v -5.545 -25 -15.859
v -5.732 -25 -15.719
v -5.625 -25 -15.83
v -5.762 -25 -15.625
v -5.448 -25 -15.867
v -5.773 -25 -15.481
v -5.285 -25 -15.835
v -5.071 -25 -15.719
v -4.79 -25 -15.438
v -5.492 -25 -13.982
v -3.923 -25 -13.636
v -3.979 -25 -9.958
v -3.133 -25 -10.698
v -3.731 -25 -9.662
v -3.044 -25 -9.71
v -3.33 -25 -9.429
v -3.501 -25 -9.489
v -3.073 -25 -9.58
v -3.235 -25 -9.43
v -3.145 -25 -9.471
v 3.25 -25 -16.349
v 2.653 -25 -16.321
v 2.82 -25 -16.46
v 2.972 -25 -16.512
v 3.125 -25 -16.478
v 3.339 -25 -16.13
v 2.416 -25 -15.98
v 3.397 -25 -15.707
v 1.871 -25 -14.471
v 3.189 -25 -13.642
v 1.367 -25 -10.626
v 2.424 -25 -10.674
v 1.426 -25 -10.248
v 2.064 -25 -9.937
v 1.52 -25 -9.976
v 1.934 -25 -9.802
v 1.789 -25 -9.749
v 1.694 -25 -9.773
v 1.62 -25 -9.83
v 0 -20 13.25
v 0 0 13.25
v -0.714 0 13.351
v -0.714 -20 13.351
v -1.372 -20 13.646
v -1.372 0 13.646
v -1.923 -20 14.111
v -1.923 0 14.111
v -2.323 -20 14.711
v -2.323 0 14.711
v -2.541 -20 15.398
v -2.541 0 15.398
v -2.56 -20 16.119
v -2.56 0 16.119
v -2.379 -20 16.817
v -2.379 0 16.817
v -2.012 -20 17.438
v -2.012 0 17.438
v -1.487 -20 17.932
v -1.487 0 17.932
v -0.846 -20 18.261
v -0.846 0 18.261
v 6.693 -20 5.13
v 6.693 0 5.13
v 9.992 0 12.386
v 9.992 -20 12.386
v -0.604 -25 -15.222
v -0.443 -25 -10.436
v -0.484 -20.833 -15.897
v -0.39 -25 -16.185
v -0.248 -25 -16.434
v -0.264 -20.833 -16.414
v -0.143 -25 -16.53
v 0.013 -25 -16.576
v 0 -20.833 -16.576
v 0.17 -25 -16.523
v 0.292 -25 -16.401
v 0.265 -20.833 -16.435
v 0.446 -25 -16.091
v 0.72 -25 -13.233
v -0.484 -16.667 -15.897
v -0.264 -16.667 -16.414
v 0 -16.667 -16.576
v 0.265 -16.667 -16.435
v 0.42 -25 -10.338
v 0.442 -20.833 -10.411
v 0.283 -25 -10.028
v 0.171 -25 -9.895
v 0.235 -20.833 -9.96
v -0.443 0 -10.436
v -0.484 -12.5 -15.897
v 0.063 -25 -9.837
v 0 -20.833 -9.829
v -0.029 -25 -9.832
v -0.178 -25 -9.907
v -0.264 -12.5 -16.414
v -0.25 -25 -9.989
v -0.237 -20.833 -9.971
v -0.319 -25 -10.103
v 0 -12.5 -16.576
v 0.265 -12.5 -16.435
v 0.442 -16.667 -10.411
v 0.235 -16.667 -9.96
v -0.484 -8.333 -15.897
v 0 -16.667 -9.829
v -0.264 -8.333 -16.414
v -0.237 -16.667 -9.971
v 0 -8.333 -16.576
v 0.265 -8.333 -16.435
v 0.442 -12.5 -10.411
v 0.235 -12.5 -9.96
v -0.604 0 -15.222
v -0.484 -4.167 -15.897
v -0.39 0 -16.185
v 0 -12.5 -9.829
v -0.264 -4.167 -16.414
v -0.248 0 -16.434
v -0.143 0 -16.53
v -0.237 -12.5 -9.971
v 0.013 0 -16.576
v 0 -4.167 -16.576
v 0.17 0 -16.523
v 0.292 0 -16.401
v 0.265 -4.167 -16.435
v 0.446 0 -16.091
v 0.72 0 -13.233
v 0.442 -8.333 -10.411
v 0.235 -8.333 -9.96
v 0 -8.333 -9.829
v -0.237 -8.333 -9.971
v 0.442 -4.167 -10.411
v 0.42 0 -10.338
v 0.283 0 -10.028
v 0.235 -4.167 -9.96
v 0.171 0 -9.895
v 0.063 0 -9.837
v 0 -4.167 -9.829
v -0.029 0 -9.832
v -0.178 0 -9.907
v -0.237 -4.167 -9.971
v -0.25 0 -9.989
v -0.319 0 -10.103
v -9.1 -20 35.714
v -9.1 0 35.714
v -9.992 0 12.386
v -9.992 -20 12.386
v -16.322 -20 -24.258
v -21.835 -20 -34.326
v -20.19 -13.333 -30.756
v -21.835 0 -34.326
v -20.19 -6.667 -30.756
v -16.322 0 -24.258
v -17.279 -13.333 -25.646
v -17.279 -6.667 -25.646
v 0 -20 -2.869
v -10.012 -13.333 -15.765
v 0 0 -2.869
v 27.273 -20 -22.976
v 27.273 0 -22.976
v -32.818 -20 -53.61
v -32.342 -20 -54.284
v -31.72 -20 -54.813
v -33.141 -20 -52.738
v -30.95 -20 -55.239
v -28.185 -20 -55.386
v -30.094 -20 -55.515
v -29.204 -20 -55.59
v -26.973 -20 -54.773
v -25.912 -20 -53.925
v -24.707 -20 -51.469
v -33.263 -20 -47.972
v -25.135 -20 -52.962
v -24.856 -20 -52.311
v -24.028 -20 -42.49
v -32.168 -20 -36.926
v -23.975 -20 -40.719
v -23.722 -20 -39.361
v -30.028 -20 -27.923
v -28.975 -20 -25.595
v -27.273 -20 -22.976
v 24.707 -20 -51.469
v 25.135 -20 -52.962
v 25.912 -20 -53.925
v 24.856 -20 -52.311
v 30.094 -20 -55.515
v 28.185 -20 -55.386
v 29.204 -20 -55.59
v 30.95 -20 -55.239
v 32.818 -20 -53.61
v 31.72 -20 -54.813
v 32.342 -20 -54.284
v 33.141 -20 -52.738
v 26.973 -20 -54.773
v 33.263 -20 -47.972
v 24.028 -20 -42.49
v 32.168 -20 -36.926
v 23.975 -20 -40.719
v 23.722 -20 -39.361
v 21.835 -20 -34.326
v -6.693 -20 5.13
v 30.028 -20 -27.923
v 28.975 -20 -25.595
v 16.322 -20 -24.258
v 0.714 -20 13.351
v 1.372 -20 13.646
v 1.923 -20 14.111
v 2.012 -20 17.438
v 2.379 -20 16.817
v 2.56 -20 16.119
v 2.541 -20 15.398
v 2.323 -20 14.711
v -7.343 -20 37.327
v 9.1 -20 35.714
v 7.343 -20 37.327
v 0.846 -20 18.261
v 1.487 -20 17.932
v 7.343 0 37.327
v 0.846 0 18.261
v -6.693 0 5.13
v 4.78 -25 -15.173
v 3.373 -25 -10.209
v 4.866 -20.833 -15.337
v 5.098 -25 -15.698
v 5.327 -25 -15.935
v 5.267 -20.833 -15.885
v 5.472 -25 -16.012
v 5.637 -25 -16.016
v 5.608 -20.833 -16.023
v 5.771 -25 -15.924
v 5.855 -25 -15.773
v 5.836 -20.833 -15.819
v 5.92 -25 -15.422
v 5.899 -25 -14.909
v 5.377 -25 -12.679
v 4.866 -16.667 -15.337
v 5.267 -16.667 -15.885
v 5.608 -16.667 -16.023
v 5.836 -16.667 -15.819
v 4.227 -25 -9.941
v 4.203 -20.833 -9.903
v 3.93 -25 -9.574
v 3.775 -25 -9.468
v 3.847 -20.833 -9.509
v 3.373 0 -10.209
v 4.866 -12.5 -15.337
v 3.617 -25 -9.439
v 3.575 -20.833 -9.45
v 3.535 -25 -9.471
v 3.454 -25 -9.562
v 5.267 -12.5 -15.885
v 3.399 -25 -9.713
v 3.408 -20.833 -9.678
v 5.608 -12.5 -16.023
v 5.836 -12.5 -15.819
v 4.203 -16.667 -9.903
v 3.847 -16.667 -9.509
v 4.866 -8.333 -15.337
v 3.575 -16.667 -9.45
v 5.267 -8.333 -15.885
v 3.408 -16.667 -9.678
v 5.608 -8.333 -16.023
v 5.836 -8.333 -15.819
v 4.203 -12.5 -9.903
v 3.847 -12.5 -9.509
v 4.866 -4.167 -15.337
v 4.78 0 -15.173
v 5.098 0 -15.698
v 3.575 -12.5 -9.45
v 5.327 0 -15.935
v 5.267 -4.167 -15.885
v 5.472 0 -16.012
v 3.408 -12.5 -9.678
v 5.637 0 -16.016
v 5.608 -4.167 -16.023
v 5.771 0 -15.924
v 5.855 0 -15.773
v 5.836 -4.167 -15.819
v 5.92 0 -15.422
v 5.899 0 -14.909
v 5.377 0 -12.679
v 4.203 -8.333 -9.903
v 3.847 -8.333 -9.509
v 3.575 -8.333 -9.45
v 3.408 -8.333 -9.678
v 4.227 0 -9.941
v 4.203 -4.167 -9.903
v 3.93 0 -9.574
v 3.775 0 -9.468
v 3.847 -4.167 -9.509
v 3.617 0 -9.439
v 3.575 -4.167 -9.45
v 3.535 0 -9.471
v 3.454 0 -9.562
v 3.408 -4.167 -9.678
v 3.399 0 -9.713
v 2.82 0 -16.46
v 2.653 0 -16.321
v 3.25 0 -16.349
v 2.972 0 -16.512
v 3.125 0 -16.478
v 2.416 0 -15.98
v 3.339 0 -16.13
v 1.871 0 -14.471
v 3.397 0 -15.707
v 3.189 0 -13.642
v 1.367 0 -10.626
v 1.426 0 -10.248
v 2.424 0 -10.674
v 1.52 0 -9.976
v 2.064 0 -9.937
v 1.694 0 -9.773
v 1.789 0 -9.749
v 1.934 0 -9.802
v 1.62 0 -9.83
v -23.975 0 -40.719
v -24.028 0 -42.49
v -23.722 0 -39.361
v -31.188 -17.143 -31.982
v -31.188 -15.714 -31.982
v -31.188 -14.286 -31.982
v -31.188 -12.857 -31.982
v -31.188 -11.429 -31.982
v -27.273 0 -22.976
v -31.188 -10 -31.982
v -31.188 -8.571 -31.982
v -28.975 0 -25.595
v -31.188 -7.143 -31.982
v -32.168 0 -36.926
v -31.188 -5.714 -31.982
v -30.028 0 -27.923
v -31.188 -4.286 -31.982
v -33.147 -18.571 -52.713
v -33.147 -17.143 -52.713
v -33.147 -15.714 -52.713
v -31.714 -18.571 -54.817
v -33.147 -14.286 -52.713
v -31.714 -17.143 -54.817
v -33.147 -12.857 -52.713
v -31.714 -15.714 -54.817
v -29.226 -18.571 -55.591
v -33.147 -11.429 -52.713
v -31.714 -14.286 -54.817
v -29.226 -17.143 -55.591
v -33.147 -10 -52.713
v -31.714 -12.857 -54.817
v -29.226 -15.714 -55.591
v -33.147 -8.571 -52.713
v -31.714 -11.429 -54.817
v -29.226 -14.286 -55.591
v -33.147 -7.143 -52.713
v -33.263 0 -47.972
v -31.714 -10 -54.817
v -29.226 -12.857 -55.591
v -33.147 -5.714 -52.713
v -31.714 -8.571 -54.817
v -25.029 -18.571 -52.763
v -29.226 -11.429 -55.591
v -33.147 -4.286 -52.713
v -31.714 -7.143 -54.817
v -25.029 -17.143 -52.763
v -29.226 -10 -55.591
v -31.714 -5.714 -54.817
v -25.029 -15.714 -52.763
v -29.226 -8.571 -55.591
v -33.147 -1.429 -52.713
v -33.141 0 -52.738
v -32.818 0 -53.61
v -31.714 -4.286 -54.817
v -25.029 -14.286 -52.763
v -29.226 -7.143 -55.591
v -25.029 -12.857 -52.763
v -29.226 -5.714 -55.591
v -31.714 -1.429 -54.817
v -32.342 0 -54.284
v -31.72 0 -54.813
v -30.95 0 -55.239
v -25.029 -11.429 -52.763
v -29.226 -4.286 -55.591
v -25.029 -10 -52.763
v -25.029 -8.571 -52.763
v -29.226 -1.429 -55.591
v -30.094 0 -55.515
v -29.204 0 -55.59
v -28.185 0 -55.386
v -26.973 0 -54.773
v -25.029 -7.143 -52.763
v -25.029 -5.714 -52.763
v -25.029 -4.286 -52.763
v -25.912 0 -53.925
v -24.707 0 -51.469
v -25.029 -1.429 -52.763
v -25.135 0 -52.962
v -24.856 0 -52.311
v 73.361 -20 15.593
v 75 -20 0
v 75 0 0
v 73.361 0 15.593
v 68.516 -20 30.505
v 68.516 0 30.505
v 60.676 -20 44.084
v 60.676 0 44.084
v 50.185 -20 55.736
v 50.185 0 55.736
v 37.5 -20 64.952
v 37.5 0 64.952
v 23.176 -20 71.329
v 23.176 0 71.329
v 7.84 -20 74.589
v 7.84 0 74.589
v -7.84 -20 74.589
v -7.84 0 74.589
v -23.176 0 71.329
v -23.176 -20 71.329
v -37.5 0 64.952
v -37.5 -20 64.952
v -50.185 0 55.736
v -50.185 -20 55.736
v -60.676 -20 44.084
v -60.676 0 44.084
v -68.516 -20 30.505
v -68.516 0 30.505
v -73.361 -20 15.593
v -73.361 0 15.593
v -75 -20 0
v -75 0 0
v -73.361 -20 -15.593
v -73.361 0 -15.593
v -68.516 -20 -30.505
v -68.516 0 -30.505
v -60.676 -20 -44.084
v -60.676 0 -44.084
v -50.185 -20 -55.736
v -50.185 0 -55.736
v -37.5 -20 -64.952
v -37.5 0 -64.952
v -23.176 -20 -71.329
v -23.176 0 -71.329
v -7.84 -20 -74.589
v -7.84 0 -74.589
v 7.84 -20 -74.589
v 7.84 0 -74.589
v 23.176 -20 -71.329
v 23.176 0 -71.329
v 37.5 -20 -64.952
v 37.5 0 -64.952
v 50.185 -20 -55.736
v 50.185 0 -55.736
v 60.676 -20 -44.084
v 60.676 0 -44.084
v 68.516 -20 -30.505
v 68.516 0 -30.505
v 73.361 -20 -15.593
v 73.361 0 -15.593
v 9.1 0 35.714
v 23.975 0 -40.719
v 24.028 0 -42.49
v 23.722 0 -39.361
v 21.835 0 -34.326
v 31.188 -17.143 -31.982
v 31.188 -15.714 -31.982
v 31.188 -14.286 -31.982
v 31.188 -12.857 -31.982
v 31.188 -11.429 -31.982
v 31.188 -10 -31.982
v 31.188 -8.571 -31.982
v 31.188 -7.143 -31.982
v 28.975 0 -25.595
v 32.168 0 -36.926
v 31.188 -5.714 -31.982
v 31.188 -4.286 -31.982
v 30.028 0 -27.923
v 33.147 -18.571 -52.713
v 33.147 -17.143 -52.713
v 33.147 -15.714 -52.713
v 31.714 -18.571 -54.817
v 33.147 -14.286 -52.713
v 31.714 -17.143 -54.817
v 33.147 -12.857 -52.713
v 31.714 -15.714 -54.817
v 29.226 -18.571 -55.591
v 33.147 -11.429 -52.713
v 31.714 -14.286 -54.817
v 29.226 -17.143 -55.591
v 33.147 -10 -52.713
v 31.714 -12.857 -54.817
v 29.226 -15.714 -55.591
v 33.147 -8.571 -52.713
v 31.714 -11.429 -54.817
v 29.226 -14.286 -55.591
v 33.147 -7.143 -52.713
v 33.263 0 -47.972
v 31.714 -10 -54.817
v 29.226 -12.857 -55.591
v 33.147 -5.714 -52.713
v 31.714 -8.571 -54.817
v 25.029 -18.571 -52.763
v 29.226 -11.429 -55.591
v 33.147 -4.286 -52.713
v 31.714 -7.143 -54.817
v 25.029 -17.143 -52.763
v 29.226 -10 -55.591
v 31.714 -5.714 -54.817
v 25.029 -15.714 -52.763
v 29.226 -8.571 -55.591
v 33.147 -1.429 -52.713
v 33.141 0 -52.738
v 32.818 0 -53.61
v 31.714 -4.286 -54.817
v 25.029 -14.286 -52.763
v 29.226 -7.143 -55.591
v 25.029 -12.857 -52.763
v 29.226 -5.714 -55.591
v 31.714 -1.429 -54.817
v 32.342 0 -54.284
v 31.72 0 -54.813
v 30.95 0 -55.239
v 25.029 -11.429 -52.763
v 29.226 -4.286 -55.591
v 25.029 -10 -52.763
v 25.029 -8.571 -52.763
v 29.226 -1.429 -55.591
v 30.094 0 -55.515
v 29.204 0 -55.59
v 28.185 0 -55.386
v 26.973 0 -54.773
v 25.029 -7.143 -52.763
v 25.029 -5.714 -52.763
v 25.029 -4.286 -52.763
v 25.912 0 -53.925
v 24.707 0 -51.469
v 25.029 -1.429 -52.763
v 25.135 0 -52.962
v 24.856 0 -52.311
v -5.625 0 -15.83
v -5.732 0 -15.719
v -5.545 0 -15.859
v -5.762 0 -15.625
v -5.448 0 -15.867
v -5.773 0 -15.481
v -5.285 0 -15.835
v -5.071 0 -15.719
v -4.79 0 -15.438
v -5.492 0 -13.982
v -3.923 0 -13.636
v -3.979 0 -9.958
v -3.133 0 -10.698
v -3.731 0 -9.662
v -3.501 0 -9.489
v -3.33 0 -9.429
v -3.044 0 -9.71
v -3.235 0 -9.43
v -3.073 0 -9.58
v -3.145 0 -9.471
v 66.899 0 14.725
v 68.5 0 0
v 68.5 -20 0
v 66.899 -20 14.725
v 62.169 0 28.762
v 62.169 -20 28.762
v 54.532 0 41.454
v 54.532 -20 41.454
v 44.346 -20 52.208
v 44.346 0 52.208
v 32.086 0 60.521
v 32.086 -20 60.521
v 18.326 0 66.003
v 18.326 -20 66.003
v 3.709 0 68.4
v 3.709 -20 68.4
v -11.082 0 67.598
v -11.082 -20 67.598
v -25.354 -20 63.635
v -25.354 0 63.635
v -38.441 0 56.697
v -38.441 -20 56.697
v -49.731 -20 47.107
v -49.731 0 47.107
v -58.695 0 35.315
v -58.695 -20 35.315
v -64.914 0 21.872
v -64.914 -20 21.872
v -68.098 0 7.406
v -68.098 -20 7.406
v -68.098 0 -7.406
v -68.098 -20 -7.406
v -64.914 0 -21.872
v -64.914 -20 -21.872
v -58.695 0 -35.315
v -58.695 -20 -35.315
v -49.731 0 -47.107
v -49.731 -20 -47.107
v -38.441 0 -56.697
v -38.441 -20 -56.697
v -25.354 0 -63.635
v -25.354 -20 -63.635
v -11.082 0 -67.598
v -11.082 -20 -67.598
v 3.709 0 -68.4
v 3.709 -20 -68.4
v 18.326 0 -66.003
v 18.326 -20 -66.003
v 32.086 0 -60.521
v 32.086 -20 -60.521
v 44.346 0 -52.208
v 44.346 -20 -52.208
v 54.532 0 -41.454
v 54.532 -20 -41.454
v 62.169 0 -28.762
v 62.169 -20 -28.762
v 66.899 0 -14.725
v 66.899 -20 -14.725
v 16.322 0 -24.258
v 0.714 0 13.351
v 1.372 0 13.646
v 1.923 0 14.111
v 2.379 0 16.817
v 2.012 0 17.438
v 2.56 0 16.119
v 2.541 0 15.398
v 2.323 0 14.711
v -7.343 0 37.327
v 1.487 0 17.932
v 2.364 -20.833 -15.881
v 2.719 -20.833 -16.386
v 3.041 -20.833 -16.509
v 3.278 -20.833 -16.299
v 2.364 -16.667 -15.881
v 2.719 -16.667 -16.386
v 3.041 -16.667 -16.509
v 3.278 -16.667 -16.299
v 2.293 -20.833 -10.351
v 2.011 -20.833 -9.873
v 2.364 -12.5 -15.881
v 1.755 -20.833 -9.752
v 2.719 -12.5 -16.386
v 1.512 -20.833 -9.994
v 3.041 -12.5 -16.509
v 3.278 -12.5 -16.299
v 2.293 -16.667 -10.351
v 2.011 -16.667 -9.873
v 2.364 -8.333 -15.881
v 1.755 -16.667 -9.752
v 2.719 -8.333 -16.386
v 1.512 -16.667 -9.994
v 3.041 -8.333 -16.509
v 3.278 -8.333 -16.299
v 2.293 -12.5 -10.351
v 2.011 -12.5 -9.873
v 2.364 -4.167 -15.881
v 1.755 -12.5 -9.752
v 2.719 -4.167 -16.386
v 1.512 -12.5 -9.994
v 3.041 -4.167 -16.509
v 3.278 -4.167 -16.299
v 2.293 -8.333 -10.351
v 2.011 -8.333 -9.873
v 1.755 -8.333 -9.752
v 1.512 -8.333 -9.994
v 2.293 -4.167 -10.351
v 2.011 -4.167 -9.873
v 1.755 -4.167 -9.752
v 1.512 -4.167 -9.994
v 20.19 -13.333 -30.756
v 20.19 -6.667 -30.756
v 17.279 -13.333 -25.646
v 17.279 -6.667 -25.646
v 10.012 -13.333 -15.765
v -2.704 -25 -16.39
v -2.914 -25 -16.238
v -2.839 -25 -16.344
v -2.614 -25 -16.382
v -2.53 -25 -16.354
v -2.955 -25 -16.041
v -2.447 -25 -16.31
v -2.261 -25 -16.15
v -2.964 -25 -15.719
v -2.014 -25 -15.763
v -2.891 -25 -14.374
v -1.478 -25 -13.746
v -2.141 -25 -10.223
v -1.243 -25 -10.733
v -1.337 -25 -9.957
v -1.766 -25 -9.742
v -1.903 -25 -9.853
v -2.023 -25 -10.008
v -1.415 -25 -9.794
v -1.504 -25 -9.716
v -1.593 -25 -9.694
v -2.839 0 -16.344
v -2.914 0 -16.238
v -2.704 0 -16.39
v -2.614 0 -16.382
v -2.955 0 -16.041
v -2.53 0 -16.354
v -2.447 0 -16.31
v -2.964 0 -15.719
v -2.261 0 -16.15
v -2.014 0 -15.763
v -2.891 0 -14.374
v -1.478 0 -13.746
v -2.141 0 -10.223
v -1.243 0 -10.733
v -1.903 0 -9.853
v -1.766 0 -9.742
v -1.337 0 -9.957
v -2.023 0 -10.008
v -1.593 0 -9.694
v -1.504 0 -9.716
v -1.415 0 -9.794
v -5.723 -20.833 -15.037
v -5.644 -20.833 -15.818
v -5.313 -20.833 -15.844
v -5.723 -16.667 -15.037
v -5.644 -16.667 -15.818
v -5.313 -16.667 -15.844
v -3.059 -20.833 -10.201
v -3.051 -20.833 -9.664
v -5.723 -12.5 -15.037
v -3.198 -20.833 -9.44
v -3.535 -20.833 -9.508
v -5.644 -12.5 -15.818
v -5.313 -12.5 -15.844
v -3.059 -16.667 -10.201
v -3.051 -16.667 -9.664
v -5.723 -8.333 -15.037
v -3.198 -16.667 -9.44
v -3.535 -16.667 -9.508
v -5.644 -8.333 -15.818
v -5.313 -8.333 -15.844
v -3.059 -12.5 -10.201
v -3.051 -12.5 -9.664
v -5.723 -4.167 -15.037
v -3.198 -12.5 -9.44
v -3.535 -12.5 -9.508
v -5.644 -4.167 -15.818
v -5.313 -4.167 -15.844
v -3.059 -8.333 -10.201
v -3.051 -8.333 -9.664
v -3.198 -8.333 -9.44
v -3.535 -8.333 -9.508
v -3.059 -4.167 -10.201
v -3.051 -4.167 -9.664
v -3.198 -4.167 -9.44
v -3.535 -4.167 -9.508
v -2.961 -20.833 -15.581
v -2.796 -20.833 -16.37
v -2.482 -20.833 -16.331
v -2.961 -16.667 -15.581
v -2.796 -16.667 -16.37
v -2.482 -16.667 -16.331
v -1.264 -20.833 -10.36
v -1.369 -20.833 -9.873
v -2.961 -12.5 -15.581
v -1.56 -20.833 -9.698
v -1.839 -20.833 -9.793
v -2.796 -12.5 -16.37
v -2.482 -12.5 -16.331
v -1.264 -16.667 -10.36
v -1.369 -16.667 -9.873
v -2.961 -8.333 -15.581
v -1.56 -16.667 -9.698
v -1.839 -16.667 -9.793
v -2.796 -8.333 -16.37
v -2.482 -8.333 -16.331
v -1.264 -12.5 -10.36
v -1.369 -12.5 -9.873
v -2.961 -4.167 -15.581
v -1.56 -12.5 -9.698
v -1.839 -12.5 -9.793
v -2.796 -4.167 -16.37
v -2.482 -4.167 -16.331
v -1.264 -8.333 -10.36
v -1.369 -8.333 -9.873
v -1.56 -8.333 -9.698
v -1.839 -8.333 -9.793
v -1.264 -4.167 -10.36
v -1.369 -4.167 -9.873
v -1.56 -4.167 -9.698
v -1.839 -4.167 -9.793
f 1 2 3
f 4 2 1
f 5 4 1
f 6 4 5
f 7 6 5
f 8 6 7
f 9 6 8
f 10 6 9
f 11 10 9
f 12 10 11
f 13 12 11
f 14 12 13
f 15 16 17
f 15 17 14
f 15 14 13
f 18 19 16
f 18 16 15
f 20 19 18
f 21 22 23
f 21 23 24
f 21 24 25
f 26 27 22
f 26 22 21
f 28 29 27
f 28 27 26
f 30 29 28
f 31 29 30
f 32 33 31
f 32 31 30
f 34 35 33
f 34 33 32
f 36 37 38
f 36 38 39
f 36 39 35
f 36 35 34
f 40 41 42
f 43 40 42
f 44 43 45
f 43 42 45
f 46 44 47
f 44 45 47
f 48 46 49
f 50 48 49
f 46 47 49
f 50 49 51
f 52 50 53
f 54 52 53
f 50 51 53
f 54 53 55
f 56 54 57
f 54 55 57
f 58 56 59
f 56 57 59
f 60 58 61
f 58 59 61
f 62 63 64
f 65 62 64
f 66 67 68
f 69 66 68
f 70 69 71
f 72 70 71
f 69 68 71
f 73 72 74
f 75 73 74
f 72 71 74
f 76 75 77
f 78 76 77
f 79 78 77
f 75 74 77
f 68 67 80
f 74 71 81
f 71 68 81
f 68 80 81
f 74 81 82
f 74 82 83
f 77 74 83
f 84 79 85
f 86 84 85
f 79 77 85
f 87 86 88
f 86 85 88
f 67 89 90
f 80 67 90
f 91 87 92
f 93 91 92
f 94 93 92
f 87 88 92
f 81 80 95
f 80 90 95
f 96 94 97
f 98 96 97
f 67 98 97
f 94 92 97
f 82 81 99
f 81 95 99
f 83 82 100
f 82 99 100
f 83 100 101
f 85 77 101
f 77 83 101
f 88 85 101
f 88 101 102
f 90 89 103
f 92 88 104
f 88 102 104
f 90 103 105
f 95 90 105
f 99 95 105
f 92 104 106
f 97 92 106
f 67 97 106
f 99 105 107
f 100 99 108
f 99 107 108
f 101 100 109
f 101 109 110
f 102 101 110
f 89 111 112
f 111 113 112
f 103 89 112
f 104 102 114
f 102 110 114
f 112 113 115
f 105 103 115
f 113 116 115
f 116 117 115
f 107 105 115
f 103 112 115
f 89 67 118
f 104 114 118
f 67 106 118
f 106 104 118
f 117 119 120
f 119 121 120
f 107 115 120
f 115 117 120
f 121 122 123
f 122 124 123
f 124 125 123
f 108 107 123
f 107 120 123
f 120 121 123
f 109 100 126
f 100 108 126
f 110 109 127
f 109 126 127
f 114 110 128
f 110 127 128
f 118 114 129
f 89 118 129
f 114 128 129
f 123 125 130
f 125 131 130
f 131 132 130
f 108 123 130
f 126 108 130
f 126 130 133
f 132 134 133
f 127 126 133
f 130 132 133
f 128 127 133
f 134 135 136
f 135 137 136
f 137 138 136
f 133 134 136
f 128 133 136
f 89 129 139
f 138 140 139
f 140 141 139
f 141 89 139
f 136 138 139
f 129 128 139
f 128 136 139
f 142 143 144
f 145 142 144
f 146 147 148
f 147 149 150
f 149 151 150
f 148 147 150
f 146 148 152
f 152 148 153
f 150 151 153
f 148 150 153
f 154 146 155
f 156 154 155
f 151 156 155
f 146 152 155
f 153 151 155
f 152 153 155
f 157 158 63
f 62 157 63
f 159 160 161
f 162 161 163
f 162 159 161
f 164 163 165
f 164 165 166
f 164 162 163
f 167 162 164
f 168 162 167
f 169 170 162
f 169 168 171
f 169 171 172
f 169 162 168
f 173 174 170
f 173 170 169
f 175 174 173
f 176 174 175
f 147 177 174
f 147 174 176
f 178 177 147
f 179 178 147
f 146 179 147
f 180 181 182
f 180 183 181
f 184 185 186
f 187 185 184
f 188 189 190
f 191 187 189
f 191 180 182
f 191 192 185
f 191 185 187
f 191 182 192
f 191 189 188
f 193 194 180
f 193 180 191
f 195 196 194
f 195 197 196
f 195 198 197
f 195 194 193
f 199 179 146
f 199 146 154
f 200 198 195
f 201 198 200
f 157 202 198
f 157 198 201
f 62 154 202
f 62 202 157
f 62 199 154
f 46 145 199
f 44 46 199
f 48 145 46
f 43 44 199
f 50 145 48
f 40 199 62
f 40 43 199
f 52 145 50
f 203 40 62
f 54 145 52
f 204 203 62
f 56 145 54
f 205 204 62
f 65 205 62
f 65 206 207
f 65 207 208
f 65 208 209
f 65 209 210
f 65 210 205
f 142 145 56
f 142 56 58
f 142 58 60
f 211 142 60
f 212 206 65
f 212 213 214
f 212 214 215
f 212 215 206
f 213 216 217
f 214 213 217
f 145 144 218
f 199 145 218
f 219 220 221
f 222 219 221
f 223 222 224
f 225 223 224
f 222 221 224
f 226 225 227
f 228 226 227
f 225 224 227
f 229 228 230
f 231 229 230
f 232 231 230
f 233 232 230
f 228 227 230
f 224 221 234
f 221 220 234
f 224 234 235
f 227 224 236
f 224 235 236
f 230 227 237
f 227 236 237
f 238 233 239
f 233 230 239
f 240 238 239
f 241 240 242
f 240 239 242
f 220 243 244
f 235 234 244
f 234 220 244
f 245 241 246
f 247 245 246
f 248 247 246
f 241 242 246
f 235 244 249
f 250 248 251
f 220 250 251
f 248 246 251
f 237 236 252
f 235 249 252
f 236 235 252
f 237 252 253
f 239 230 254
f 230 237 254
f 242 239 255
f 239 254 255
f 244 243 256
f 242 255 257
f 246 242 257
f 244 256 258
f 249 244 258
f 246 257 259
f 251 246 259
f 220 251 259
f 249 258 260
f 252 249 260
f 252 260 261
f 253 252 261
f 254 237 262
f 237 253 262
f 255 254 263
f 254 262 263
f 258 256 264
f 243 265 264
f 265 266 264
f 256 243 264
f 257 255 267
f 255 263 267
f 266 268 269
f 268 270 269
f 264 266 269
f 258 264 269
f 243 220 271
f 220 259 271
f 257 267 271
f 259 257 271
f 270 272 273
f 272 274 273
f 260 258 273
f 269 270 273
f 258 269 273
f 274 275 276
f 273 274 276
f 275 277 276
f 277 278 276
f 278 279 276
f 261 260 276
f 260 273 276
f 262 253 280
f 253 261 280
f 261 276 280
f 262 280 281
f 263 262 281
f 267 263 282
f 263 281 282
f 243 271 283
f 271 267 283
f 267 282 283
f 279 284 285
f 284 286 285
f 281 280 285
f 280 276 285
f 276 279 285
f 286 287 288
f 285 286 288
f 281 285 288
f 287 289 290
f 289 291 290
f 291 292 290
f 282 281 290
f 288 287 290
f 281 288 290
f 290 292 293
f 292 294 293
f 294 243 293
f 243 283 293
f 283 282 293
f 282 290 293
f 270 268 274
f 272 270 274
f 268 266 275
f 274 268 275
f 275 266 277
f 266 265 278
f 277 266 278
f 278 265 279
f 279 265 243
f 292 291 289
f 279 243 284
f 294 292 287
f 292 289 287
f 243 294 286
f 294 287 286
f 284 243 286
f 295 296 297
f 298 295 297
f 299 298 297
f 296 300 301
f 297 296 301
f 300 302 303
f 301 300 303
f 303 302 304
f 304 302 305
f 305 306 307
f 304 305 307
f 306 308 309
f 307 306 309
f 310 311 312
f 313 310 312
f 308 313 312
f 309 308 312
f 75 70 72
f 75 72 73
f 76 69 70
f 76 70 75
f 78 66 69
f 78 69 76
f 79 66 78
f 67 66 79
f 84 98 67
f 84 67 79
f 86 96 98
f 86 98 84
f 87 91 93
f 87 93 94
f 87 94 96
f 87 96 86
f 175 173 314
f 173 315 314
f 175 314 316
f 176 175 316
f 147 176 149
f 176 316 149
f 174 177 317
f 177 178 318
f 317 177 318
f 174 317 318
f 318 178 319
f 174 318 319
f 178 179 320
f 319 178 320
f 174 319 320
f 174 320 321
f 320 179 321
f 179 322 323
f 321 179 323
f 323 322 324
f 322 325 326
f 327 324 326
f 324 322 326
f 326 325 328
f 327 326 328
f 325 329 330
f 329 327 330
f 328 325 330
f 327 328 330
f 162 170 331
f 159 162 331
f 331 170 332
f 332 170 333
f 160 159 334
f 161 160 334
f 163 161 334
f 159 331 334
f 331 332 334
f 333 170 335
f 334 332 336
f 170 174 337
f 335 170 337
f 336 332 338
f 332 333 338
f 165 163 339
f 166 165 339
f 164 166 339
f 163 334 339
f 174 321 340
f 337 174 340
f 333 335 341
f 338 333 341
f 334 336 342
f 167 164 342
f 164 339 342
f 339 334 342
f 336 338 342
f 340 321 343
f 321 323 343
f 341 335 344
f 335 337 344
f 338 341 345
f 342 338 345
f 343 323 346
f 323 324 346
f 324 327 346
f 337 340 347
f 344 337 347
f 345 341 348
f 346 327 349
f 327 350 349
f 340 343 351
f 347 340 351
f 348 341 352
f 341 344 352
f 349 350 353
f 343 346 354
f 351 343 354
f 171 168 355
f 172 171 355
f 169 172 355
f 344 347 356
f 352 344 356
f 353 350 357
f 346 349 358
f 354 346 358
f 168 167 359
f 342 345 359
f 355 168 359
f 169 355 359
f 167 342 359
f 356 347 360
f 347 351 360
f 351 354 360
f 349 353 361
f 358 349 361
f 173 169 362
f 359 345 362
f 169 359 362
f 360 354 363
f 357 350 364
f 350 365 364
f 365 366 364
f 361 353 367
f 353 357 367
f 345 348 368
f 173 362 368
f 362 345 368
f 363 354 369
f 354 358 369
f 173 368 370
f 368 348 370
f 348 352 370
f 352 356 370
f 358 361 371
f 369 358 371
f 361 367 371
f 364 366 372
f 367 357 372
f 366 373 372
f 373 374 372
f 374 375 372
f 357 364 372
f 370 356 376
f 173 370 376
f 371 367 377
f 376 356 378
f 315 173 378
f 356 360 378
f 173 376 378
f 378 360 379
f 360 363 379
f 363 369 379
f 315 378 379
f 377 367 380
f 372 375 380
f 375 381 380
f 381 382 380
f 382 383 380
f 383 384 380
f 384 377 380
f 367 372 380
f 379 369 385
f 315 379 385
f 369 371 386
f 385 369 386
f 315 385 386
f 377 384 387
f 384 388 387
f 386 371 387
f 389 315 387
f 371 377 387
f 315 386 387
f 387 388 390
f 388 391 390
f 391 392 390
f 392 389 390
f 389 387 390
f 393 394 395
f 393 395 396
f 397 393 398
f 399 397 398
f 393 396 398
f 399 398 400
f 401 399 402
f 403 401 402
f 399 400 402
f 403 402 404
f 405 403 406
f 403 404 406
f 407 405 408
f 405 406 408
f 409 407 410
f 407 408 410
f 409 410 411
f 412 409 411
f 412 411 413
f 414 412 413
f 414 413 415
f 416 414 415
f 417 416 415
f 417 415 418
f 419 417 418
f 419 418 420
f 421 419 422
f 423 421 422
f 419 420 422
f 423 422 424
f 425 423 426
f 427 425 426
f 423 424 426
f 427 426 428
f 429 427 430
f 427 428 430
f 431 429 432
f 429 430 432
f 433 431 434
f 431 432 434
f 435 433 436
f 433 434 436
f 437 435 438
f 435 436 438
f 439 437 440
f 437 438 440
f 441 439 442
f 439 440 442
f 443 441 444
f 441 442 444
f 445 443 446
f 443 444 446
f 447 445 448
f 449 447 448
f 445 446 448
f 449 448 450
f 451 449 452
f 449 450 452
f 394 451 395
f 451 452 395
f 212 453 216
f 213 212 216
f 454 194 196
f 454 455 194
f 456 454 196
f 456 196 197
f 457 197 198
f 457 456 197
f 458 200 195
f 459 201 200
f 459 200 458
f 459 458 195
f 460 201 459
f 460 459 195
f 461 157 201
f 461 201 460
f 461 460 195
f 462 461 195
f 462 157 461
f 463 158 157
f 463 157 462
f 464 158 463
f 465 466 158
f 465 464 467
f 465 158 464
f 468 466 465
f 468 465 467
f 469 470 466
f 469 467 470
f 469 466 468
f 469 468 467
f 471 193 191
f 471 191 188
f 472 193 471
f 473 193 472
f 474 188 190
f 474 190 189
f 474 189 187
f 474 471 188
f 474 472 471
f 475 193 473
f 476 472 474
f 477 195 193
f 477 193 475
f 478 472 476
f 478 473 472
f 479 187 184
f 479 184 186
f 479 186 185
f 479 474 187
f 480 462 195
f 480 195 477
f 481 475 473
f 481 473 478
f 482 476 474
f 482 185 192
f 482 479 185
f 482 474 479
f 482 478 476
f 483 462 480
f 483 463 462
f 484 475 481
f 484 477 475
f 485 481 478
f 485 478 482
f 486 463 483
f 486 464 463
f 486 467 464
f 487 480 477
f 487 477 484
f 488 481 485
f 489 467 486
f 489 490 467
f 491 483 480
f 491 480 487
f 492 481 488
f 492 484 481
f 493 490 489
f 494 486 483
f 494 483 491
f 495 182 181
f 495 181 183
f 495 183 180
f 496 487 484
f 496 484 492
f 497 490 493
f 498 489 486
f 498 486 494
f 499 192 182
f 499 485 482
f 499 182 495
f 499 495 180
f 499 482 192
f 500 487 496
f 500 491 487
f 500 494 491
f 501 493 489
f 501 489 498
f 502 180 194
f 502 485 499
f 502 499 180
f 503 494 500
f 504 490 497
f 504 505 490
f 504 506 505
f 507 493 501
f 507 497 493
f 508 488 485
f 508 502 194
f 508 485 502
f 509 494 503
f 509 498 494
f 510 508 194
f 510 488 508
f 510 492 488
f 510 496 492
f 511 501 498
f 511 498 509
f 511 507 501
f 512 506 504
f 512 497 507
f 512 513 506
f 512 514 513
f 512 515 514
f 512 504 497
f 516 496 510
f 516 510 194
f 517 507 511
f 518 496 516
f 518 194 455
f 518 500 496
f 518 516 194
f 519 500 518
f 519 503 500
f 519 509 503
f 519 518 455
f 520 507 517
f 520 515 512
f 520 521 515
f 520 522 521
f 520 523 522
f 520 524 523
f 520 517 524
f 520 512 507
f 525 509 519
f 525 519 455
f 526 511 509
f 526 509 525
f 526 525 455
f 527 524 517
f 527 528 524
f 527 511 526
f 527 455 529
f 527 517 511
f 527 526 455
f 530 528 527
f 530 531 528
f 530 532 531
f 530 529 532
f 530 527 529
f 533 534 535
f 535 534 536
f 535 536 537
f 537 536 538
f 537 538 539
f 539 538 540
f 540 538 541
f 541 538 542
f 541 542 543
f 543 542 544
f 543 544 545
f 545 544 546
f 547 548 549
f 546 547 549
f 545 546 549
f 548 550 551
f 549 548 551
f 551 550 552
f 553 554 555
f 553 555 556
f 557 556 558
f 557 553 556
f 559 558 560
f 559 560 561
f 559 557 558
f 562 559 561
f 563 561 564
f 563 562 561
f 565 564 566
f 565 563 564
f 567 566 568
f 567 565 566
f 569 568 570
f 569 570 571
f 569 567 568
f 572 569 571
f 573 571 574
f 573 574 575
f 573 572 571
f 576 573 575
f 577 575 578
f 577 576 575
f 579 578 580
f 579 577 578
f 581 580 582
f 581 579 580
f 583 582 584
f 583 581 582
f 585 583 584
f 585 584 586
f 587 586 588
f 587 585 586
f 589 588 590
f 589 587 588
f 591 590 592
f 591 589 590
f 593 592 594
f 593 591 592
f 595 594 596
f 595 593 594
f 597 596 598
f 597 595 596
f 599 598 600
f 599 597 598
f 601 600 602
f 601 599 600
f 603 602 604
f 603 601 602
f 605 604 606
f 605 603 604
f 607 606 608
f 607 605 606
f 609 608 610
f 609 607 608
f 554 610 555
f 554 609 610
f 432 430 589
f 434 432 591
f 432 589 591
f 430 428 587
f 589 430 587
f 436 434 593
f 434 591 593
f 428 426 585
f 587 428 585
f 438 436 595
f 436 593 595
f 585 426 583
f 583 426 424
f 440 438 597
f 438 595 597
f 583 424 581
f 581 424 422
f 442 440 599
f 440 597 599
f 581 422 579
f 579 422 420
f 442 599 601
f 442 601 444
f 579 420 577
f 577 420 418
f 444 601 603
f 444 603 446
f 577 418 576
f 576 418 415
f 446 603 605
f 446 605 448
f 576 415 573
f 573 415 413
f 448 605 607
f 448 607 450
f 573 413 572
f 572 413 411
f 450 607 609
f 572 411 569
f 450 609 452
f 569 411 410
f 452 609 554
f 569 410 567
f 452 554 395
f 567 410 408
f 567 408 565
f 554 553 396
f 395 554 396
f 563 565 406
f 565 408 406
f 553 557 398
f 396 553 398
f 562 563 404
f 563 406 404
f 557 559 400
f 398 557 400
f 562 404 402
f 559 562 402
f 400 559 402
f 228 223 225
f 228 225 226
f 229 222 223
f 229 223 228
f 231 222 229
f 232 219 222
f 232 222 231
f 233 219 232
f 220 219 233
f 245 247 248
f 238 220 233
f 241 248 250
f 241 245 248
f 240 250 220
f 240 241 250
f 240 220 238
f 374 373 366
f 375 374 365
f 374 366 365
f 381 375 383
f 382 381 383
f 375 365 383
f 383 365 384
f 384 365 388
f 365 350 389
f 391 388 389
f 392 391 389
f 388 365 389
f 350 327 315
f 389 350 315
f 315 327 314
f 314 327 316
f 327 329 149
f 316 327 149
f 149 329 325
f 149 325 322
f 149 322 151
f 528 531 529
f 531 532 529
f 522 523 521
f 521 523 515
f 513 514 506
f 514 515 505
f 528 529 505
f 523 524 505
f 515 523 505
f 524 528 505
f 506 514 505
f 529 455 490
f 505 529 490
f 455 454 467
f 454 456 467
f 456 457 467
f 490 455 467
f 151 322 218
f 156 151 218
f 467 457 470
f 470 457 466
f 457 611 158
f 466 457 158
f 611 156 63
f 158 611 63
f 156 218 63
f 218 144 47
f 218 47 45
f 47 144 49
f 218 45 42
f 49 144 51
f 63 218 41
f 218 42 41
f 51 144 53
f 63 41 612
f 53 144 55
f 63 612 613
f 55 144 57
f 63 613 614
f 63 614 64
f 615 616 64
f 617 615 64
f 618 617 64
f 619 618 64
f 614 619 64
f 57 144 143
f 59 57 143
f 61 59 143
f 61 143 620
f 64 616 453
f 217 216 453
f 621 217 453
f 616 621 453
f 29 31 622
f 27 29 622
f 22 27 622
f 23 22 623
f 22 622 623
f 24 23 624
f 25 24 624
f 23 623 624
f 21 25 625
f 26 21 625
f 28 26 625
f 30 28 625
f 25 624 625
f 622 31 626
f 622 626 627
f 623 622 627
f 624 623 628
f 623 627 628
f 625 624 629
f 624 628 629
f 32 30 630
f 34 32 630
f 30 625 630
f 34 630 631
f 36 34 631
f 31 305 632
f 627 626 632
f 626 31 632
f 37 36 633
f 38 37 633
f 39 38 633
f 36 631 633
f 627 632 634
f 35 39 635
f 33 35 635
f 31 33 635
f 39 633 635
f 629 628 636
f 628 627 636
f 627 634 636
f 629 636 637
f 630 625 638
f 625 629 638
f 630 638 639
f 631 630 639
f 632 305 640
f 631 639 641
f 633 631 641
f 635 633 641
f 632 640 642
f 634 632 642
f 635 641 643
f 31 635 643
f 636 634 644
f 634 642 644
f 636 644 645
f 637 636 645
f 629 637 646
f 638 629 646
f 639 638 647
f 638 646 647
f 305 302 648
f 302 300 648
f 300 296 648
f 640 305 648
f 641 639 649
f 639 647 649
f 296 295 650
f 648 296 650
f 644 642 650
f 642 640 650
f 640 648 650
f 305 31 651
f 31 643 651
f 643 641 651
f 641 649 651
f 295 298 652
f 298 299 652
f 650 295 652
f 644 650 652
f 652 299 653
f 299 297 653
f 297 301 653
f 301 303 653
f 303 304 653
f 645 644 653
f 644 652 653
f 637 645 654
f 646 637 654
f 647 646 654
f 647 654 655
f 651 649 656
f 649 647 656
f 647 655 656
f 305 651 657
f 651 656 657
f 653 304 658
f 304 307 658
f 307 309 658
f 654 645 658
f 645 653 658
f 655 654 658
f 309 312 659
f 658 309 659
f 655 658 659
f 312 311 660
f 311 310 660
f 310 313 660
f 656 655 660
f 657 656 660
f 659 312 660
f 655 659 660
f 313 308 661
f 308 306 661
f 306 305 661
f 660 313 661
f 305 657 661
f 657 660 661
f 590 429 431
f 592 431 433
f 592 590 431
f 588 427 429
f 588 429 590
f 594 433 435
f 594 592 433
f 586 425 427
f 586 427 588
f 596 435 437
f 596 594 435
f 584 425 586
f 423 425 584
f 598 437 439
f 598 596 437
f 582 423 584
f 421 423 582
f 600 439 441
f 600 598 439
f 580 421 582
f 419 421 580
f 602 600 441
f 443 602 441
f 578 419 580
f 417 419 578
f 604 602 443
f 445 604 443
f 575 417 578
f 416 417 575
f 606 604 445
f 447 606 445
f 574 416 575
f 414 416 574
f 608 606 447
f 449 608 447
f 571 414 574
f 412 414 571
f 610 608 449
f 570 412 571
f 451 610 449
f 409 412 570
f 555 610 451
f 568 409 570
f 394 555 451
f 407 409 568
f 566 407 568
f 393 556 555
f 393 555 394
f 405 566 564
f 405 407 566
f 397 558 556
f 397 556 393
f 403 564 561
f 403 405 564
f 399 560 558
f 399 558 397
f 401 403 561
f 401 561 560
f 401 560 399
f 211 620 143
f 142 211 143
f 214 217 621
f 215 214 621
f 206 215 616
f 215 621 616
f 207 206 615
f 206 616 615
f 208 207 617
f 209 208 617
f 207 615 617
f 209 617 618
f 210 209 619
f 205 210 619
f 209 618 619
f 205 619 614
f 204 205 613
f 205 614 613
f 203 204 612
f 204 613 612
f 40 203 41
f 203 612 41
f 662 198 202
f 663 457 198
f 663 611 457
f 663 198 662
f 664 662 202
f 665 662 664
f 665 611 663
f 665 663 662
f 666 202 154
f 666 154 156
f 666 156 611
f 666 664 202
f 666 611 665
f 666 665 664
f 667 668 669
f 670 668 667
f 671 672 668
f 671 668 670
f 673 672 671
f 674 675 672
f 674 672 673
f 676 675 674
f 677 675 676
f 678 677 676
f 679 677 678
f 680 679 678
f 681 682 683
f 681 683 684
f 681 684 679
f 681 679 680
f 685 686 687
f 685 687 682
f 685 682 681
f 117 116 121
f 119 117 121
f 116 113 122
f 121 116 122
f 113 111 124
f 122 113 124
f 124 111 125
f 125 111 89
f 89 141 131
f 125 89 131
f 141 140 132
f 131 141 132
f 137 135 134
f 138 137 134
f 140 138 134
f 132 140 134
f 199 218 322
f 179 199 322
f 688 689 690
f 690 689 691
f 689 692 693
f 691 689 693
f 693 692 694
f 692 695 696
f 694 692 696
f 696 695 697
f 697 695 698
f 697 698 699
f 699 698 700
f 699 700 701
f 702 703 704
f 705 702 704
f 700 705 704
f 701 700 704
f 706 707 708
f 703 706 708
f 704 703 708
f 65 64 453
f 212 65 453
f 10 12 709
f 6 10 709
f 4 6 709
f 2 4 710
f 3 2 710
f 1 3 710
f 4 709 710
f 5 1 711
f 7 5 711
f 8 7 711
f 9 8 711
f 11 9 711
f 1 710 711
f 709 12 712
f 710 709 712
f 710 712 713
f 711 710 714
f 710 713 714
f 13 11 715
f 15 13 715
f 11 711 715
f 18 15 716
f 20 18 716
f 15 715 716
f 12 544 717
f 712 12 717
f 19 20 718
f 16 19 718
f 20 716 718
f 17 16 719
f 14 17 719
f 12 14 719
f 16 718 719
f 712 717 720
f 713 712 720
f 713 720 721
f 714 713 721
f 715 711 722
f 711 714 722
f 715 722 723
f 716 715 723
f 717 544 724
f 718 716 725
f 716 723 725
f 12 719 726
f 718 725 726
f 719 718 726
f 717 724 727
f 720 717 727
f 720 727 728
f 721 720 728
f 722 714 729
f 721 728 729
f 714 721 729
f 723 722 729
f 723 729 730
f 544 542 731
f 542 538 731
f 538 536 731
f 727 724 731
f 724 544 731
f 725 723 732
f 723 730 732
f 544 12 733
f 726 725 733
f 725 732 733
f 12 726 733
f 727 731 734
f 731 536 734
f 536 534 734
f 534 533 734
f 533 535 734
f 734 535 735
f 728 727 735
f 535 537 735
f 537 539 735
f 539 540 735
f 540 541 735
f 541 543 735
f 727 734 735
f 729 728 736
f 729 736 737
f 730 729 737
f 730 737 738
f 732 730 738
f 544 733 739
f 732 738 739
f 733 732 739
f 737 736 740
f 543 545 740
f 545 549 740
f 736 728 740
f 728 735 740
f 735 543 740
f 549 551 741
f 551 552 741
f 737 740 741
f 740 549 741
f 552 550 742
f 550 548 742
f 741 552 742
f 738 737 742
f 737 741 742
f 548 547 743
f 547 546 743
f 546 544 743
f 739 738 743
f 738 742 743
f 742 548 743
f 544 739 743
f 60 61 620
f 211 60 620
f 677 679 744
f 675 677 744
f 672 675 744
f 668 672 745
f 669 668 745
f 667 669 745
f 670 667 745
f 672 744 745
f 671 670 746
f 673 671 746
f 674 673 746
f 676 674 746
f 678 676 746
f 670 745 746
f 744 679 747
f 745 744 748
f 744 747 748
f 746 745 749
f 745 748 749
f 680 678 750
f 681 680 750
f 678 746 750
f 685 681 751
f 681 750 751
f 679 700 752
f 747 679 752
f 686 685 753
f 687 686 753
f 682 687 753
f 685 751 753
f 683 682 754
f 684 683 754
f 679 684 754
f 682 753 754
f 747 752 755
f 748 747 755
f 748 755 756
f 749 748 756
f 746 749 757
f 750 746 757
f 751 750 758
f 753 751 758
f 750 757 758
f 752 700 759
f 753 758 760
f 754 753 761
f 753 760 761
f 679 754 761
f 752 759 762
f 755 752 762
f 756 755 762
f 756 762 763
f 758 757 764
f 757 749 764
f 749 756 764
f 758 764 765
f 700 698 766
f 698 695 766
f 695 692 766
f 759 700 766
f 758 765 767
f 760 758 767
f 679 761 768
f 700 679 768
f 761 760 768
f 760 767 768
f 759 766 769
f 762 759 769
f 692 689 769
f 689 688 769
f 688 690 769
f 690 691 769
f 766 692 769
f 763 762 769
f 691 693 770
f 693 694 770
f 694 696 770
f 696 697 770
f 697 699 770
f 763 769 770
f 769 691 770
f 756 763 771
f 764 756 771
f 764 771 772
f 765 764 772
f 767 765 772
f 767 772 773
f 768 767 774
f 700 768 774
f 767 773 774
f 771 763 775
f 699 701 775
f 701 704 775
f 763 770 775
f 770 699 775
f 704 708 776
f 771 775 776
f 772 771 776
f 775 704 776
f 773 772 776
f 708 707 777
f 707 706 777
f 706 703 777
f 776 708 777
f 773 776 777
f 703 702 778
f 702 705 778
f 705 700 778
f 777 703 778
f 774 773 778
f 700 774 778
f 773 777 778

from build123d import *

# Parameters (mm, degrees)
F0_R     = 75
F0_R_2   = 68.5
F3_DEPTH = 20
F4_DEPTH = 20
F5_DEPTH = 25


# Not quite as in the source:
# - the program builds the solid bodies; features that only make, move or delete a surface that nothing else refers to are left out


with BuildPart() as f3:
    # F0 (on Front) → F3 (new body)
    with BuildSketch(Plane.XZ):
        Circle(F0_R)
        Circle(F0_R_2, mode=Mode.SUBTRACT)
    extrude(amount=F3_DEPTH)


with BuildPart() as f4:
    # F1 (on Front) → F4 (new body)
    with BuildSketch(Plane.XZ):
        with BuildLine():
            Line((-9.0995086357, 35.7137694955), (-9.9920583889, 12.3855927959))
            Line((-9.9920583889, 12.3855927959), (-6.6928253509, 5.1298425533))
            Line((-6.6928253509, 5.1298425533), (-27.2733609587, -22.9763794423))
            add(Edge.make_bspline(
                [(-27.2733609587, -22.9763794423), (-28.0701572192, -24.1113172157), (-29.7872293545, -26.5540850688), (-31.2685830075, -32.0626437011), (-32.2245036764, -36.8943208623), (-32.9847834531, -42.7925387191), (-33.158807326, -46.8342729752), (-33.6305868752, -52.7804458081), (-31.9328109038, -54.9564916282), (-29.1769791488, -55.9719408417), (-26.6229388074, -54.7266613513), (-24.7400791093, -52.7872522334), (-24.6867835743, -50.4482589336), (-23.8091970418, -43.7699607903), (-24.295828176, -39.8589629216), (-22.549959608, -36.3023901443), (-21.8346624254, -34.3259416133)],
                knots=[0, 0, 0, 0, 0.072807798, 0.1555955303, 0.2349482052, 0.3188790992, 0.3920771862, 0.4755345455, 0.5311831014, 0.5880551952, 0.6460190998, 0.7009696888, 0.7541334009, 0.8440572518, 0.9149232468, 1, 1, 1, 1], degree=3))
            add(Edge.make_bspline(
                [(-21.8346624254, -34.3259416133), (-21.1977907958, -33.16729403), (-20.1480574173, -30.456005728), (-17.1283124622, -24.7557830955), (-6.9783833146, -11.8166051914), (0, -2.868756419)],
                knots=[0, 0, 0, 0, 0.2032576565, 0.4518618851, 1, 1, 1, 1], degree=3))
            Line((0, -2.868756419), (0, 13.2500697194))
            ThreePointArc((0, 13.2500697194), (-2.5411327705, 15.3983203428), (-0.8456606301, 18.2614848018))
            Line((-0.8456606301, 18.2614848018), (-7.3425769806, 37.3269505799))
            Line((-7.3425769806, 37.3269505799), (-9.0995086357, 35.7137694955))
        make_face()
        with BuildLine():
            ThreePointArc((0.8456606301, 18.2614848018), (2.5411327705, 15.3983203428), (0, 13.2500697194))
            Line((0, 13.2500697194), (0, -2.868756419))
            add(Edge.make_bspline(
                [(21.8346624254, -34.3259416133), (21.1977907958, -33.16729403), (20.1480574173, -30.456005728), (17.1283124622, -24.7557830955), (6.9783833146, -11.8166051914), (0, -2.868756419)],
                knots=[0, 0, 0, 0, 0.2032576565, 0.4518618851, 1, 1, 1, 1], degree=3))
            add(Edge.make_bspline(
                [(27.2733609587, -22.9763794423), (28.0701572192, -24.1113172157), (29.7872293545, -26.5540850688), (31.2685830075, -32.0626437011), (32.2245036764, -36.8943208623), (32.9847834531, -42.7925387191), (33.158807326, -46.8342729752), (33.6305868752, -52.7804458081), (31.9328109038, -54.9564916282), (29.1769791488, -55.9719408417), (26.6229388074, -54.7266613513), (24.7400791093, -52.7872522334), (24.6867835743, -50.4482589336), (23.8091970418, -43.7699607903), (24.295828176, -39.8589629216), (22.549959608, -36.3023901443), (21.8346624254, -34.3259416133)],
                knots=[0, 0, 0, 0, 0.072807798, 0.1555955303, 0.2349482052, 0.3188790992, 0.3920771862, 0.4755345455, 0.5311831014, 0.5880551952, 0.6460190998, 0.7009696888, 0.7541334009, 0.8440572518, 0.9149232468, 1, 1, 1, 1], degree=3))
            Line((27.2733609587, -22.9763794423), (6.6928253509, 5.1298425533))
            Line((6.6928253509, 5.1298425533), (9.9920583889, 12.3855927959))
            Line((9.9920583889, 12.3855927959), (9.0995086357, 35.7137694955))
            Line((9.0995086357, 35.7137694955), (7.3425769806, 37.3269505799))
            Line((7.3425769806, 37.3269505799), (0.8456606301, 18.2614848018))
        make_face()
    extrude(amount=F4_DEPTH)


with BuildPart() as f5:
    # F2 (on Front) → F5 (new body)
    with BuildSketch(Plane.XZ):
        with BuildLine():
            add(Edge.make_bspline(
                [(-3.979253338, -9.9576336976), (-4.7234029968, -11.020130225), (-5.8184468002, -14.9108947774), (-5.7897516039, -15.9524187409), (-4.3693884753, -15.7940391734), (-2.8935100281, -10.3328801035), (-3.0911885315, -9.2502342639), (-3.6684479768, -9.5138659513), (-3.979253338, -9.9576336976)],
                knots=[0, 0, 0, 0, 0.2780047915, 0.3842955615, 0.4939509538, 0.7783698483, 0.8838870936, 1, 1, 1, 1], degree=3))
        make_face()
    extrude(amount=F5_DEPTH)


with BuildPart() as f5b:
    # F2 (on Front) → F5, piece 2 (new body)
    with BuildSketch(Plane.XZ):
        with BuildLine():
            add(Edge.make_bspline(
                [(-2.1406578188, -10.2233118998), (-2.6474458062, -11.3166308025), (-3.0338956059, -15.4694728402), (-2.9289606035, -16.5348183601), (-1.5817817155, -16.0908600995), (-1.0340360871, -10.4368448604), (-1.5052646067, -9.5319348747), (-1.9480069005, -9.8076965028), (-2.1406578188, -10.2233118998)],
                knots=[0, 0, 0, 0, 0.2824524627, 0.3913703426, 0.5013182062, 0.7892651608, 0.8926282239, 1, 1, 1, 1], degree=3))
        make_face()
    extrude(amount=F5_DEPTH)


with BuildPart() as f5c:
    # F2 (on Front) → F5, piece 3 (new body)
    with BuildSketch(Plane.XZ):
        with BuildLine():
            add(Edge.make_bspline(
                [(-0.4428708344, -10.4359230027), (-0.7679443068, -11.6027928695), (-0.8129996926, -15.8735305643), (-0.0092816936, -16.7627087867), (0.8490072939, -15.937818454), (0.759733332, -10.4292701958), (-0.0030141921, -9.6638237199), (-0.3223258254, -10.0032197818), (-0.4428708344, -10.4359230027)],
                knots=[0, 0, 0, 0, 0.2843492762, 0.3954718988, 0.5043563334, 0.7906022123, 0.8945564958, 1, 1, 1, 1], degree=3))
        make_face()
    extrude(amount=F5_DEPTH)


with BuildPart() as f5d:
    # F2 (on Front) → F5, piece 4 (new body)
    with BuildSketch(Plane.XZ):
        with BuildLine():
            add(Edge.make_bspline(
                [(1.3673621106, -10.6255200318), (1.2564075628, -11.9354456348), (2.0140270441, -15.9035244545), (3.0804786381, -16.7230068951), (3.7254514579, -15.6336444386), (2.558694432, -10.3843869657), (1.7256497602, -9.521754608), (1.4142592239, -10.0718543126), (1.3673621106, -10.6255200318)],
                knots=[0, 0, 0, 0, 0.2749070885, 0.3890790555, 0.4983250276, 0.7771368273, 0.8838051332, 1, 1, 1, 1], degree=3))
        make_face()
    extrude(amount=F5_DEPTH)


with BuildPart() as f5e:
    # F2 (on Front) → F5, piece 5 (new body)
    with BuildSketch(Plane.XZ):
        with BuildLine():
            add(Edge.make_bspline(
                [(3.3727246337, -10.2085033432), (3.4403839991, -11.4169141621), (4.5571836092, -15.3596231402), (5.6356497321, -16.2493912459), (6.2925703598, -15.1500632705), (4.5332733528, -9.8337640221), (3.5031655273, -9.2729109296), (3.3467951481, -9.7453971539), (3.3727246337, -10.2085033432)],
                knots=[0, 0, 0, 0, 0.2765236536, 0.3967819627, 0.5046019431, 0.7887525835, 0.8940262587, 1, 1, 1, 1], degree=3))
        make_face()
    extrude(amount=F5_DEPTH)


solid = Compound([f3.part, f4.part, f5.part, f5b.part, f5c.part, f5d.part, f5e.part])
